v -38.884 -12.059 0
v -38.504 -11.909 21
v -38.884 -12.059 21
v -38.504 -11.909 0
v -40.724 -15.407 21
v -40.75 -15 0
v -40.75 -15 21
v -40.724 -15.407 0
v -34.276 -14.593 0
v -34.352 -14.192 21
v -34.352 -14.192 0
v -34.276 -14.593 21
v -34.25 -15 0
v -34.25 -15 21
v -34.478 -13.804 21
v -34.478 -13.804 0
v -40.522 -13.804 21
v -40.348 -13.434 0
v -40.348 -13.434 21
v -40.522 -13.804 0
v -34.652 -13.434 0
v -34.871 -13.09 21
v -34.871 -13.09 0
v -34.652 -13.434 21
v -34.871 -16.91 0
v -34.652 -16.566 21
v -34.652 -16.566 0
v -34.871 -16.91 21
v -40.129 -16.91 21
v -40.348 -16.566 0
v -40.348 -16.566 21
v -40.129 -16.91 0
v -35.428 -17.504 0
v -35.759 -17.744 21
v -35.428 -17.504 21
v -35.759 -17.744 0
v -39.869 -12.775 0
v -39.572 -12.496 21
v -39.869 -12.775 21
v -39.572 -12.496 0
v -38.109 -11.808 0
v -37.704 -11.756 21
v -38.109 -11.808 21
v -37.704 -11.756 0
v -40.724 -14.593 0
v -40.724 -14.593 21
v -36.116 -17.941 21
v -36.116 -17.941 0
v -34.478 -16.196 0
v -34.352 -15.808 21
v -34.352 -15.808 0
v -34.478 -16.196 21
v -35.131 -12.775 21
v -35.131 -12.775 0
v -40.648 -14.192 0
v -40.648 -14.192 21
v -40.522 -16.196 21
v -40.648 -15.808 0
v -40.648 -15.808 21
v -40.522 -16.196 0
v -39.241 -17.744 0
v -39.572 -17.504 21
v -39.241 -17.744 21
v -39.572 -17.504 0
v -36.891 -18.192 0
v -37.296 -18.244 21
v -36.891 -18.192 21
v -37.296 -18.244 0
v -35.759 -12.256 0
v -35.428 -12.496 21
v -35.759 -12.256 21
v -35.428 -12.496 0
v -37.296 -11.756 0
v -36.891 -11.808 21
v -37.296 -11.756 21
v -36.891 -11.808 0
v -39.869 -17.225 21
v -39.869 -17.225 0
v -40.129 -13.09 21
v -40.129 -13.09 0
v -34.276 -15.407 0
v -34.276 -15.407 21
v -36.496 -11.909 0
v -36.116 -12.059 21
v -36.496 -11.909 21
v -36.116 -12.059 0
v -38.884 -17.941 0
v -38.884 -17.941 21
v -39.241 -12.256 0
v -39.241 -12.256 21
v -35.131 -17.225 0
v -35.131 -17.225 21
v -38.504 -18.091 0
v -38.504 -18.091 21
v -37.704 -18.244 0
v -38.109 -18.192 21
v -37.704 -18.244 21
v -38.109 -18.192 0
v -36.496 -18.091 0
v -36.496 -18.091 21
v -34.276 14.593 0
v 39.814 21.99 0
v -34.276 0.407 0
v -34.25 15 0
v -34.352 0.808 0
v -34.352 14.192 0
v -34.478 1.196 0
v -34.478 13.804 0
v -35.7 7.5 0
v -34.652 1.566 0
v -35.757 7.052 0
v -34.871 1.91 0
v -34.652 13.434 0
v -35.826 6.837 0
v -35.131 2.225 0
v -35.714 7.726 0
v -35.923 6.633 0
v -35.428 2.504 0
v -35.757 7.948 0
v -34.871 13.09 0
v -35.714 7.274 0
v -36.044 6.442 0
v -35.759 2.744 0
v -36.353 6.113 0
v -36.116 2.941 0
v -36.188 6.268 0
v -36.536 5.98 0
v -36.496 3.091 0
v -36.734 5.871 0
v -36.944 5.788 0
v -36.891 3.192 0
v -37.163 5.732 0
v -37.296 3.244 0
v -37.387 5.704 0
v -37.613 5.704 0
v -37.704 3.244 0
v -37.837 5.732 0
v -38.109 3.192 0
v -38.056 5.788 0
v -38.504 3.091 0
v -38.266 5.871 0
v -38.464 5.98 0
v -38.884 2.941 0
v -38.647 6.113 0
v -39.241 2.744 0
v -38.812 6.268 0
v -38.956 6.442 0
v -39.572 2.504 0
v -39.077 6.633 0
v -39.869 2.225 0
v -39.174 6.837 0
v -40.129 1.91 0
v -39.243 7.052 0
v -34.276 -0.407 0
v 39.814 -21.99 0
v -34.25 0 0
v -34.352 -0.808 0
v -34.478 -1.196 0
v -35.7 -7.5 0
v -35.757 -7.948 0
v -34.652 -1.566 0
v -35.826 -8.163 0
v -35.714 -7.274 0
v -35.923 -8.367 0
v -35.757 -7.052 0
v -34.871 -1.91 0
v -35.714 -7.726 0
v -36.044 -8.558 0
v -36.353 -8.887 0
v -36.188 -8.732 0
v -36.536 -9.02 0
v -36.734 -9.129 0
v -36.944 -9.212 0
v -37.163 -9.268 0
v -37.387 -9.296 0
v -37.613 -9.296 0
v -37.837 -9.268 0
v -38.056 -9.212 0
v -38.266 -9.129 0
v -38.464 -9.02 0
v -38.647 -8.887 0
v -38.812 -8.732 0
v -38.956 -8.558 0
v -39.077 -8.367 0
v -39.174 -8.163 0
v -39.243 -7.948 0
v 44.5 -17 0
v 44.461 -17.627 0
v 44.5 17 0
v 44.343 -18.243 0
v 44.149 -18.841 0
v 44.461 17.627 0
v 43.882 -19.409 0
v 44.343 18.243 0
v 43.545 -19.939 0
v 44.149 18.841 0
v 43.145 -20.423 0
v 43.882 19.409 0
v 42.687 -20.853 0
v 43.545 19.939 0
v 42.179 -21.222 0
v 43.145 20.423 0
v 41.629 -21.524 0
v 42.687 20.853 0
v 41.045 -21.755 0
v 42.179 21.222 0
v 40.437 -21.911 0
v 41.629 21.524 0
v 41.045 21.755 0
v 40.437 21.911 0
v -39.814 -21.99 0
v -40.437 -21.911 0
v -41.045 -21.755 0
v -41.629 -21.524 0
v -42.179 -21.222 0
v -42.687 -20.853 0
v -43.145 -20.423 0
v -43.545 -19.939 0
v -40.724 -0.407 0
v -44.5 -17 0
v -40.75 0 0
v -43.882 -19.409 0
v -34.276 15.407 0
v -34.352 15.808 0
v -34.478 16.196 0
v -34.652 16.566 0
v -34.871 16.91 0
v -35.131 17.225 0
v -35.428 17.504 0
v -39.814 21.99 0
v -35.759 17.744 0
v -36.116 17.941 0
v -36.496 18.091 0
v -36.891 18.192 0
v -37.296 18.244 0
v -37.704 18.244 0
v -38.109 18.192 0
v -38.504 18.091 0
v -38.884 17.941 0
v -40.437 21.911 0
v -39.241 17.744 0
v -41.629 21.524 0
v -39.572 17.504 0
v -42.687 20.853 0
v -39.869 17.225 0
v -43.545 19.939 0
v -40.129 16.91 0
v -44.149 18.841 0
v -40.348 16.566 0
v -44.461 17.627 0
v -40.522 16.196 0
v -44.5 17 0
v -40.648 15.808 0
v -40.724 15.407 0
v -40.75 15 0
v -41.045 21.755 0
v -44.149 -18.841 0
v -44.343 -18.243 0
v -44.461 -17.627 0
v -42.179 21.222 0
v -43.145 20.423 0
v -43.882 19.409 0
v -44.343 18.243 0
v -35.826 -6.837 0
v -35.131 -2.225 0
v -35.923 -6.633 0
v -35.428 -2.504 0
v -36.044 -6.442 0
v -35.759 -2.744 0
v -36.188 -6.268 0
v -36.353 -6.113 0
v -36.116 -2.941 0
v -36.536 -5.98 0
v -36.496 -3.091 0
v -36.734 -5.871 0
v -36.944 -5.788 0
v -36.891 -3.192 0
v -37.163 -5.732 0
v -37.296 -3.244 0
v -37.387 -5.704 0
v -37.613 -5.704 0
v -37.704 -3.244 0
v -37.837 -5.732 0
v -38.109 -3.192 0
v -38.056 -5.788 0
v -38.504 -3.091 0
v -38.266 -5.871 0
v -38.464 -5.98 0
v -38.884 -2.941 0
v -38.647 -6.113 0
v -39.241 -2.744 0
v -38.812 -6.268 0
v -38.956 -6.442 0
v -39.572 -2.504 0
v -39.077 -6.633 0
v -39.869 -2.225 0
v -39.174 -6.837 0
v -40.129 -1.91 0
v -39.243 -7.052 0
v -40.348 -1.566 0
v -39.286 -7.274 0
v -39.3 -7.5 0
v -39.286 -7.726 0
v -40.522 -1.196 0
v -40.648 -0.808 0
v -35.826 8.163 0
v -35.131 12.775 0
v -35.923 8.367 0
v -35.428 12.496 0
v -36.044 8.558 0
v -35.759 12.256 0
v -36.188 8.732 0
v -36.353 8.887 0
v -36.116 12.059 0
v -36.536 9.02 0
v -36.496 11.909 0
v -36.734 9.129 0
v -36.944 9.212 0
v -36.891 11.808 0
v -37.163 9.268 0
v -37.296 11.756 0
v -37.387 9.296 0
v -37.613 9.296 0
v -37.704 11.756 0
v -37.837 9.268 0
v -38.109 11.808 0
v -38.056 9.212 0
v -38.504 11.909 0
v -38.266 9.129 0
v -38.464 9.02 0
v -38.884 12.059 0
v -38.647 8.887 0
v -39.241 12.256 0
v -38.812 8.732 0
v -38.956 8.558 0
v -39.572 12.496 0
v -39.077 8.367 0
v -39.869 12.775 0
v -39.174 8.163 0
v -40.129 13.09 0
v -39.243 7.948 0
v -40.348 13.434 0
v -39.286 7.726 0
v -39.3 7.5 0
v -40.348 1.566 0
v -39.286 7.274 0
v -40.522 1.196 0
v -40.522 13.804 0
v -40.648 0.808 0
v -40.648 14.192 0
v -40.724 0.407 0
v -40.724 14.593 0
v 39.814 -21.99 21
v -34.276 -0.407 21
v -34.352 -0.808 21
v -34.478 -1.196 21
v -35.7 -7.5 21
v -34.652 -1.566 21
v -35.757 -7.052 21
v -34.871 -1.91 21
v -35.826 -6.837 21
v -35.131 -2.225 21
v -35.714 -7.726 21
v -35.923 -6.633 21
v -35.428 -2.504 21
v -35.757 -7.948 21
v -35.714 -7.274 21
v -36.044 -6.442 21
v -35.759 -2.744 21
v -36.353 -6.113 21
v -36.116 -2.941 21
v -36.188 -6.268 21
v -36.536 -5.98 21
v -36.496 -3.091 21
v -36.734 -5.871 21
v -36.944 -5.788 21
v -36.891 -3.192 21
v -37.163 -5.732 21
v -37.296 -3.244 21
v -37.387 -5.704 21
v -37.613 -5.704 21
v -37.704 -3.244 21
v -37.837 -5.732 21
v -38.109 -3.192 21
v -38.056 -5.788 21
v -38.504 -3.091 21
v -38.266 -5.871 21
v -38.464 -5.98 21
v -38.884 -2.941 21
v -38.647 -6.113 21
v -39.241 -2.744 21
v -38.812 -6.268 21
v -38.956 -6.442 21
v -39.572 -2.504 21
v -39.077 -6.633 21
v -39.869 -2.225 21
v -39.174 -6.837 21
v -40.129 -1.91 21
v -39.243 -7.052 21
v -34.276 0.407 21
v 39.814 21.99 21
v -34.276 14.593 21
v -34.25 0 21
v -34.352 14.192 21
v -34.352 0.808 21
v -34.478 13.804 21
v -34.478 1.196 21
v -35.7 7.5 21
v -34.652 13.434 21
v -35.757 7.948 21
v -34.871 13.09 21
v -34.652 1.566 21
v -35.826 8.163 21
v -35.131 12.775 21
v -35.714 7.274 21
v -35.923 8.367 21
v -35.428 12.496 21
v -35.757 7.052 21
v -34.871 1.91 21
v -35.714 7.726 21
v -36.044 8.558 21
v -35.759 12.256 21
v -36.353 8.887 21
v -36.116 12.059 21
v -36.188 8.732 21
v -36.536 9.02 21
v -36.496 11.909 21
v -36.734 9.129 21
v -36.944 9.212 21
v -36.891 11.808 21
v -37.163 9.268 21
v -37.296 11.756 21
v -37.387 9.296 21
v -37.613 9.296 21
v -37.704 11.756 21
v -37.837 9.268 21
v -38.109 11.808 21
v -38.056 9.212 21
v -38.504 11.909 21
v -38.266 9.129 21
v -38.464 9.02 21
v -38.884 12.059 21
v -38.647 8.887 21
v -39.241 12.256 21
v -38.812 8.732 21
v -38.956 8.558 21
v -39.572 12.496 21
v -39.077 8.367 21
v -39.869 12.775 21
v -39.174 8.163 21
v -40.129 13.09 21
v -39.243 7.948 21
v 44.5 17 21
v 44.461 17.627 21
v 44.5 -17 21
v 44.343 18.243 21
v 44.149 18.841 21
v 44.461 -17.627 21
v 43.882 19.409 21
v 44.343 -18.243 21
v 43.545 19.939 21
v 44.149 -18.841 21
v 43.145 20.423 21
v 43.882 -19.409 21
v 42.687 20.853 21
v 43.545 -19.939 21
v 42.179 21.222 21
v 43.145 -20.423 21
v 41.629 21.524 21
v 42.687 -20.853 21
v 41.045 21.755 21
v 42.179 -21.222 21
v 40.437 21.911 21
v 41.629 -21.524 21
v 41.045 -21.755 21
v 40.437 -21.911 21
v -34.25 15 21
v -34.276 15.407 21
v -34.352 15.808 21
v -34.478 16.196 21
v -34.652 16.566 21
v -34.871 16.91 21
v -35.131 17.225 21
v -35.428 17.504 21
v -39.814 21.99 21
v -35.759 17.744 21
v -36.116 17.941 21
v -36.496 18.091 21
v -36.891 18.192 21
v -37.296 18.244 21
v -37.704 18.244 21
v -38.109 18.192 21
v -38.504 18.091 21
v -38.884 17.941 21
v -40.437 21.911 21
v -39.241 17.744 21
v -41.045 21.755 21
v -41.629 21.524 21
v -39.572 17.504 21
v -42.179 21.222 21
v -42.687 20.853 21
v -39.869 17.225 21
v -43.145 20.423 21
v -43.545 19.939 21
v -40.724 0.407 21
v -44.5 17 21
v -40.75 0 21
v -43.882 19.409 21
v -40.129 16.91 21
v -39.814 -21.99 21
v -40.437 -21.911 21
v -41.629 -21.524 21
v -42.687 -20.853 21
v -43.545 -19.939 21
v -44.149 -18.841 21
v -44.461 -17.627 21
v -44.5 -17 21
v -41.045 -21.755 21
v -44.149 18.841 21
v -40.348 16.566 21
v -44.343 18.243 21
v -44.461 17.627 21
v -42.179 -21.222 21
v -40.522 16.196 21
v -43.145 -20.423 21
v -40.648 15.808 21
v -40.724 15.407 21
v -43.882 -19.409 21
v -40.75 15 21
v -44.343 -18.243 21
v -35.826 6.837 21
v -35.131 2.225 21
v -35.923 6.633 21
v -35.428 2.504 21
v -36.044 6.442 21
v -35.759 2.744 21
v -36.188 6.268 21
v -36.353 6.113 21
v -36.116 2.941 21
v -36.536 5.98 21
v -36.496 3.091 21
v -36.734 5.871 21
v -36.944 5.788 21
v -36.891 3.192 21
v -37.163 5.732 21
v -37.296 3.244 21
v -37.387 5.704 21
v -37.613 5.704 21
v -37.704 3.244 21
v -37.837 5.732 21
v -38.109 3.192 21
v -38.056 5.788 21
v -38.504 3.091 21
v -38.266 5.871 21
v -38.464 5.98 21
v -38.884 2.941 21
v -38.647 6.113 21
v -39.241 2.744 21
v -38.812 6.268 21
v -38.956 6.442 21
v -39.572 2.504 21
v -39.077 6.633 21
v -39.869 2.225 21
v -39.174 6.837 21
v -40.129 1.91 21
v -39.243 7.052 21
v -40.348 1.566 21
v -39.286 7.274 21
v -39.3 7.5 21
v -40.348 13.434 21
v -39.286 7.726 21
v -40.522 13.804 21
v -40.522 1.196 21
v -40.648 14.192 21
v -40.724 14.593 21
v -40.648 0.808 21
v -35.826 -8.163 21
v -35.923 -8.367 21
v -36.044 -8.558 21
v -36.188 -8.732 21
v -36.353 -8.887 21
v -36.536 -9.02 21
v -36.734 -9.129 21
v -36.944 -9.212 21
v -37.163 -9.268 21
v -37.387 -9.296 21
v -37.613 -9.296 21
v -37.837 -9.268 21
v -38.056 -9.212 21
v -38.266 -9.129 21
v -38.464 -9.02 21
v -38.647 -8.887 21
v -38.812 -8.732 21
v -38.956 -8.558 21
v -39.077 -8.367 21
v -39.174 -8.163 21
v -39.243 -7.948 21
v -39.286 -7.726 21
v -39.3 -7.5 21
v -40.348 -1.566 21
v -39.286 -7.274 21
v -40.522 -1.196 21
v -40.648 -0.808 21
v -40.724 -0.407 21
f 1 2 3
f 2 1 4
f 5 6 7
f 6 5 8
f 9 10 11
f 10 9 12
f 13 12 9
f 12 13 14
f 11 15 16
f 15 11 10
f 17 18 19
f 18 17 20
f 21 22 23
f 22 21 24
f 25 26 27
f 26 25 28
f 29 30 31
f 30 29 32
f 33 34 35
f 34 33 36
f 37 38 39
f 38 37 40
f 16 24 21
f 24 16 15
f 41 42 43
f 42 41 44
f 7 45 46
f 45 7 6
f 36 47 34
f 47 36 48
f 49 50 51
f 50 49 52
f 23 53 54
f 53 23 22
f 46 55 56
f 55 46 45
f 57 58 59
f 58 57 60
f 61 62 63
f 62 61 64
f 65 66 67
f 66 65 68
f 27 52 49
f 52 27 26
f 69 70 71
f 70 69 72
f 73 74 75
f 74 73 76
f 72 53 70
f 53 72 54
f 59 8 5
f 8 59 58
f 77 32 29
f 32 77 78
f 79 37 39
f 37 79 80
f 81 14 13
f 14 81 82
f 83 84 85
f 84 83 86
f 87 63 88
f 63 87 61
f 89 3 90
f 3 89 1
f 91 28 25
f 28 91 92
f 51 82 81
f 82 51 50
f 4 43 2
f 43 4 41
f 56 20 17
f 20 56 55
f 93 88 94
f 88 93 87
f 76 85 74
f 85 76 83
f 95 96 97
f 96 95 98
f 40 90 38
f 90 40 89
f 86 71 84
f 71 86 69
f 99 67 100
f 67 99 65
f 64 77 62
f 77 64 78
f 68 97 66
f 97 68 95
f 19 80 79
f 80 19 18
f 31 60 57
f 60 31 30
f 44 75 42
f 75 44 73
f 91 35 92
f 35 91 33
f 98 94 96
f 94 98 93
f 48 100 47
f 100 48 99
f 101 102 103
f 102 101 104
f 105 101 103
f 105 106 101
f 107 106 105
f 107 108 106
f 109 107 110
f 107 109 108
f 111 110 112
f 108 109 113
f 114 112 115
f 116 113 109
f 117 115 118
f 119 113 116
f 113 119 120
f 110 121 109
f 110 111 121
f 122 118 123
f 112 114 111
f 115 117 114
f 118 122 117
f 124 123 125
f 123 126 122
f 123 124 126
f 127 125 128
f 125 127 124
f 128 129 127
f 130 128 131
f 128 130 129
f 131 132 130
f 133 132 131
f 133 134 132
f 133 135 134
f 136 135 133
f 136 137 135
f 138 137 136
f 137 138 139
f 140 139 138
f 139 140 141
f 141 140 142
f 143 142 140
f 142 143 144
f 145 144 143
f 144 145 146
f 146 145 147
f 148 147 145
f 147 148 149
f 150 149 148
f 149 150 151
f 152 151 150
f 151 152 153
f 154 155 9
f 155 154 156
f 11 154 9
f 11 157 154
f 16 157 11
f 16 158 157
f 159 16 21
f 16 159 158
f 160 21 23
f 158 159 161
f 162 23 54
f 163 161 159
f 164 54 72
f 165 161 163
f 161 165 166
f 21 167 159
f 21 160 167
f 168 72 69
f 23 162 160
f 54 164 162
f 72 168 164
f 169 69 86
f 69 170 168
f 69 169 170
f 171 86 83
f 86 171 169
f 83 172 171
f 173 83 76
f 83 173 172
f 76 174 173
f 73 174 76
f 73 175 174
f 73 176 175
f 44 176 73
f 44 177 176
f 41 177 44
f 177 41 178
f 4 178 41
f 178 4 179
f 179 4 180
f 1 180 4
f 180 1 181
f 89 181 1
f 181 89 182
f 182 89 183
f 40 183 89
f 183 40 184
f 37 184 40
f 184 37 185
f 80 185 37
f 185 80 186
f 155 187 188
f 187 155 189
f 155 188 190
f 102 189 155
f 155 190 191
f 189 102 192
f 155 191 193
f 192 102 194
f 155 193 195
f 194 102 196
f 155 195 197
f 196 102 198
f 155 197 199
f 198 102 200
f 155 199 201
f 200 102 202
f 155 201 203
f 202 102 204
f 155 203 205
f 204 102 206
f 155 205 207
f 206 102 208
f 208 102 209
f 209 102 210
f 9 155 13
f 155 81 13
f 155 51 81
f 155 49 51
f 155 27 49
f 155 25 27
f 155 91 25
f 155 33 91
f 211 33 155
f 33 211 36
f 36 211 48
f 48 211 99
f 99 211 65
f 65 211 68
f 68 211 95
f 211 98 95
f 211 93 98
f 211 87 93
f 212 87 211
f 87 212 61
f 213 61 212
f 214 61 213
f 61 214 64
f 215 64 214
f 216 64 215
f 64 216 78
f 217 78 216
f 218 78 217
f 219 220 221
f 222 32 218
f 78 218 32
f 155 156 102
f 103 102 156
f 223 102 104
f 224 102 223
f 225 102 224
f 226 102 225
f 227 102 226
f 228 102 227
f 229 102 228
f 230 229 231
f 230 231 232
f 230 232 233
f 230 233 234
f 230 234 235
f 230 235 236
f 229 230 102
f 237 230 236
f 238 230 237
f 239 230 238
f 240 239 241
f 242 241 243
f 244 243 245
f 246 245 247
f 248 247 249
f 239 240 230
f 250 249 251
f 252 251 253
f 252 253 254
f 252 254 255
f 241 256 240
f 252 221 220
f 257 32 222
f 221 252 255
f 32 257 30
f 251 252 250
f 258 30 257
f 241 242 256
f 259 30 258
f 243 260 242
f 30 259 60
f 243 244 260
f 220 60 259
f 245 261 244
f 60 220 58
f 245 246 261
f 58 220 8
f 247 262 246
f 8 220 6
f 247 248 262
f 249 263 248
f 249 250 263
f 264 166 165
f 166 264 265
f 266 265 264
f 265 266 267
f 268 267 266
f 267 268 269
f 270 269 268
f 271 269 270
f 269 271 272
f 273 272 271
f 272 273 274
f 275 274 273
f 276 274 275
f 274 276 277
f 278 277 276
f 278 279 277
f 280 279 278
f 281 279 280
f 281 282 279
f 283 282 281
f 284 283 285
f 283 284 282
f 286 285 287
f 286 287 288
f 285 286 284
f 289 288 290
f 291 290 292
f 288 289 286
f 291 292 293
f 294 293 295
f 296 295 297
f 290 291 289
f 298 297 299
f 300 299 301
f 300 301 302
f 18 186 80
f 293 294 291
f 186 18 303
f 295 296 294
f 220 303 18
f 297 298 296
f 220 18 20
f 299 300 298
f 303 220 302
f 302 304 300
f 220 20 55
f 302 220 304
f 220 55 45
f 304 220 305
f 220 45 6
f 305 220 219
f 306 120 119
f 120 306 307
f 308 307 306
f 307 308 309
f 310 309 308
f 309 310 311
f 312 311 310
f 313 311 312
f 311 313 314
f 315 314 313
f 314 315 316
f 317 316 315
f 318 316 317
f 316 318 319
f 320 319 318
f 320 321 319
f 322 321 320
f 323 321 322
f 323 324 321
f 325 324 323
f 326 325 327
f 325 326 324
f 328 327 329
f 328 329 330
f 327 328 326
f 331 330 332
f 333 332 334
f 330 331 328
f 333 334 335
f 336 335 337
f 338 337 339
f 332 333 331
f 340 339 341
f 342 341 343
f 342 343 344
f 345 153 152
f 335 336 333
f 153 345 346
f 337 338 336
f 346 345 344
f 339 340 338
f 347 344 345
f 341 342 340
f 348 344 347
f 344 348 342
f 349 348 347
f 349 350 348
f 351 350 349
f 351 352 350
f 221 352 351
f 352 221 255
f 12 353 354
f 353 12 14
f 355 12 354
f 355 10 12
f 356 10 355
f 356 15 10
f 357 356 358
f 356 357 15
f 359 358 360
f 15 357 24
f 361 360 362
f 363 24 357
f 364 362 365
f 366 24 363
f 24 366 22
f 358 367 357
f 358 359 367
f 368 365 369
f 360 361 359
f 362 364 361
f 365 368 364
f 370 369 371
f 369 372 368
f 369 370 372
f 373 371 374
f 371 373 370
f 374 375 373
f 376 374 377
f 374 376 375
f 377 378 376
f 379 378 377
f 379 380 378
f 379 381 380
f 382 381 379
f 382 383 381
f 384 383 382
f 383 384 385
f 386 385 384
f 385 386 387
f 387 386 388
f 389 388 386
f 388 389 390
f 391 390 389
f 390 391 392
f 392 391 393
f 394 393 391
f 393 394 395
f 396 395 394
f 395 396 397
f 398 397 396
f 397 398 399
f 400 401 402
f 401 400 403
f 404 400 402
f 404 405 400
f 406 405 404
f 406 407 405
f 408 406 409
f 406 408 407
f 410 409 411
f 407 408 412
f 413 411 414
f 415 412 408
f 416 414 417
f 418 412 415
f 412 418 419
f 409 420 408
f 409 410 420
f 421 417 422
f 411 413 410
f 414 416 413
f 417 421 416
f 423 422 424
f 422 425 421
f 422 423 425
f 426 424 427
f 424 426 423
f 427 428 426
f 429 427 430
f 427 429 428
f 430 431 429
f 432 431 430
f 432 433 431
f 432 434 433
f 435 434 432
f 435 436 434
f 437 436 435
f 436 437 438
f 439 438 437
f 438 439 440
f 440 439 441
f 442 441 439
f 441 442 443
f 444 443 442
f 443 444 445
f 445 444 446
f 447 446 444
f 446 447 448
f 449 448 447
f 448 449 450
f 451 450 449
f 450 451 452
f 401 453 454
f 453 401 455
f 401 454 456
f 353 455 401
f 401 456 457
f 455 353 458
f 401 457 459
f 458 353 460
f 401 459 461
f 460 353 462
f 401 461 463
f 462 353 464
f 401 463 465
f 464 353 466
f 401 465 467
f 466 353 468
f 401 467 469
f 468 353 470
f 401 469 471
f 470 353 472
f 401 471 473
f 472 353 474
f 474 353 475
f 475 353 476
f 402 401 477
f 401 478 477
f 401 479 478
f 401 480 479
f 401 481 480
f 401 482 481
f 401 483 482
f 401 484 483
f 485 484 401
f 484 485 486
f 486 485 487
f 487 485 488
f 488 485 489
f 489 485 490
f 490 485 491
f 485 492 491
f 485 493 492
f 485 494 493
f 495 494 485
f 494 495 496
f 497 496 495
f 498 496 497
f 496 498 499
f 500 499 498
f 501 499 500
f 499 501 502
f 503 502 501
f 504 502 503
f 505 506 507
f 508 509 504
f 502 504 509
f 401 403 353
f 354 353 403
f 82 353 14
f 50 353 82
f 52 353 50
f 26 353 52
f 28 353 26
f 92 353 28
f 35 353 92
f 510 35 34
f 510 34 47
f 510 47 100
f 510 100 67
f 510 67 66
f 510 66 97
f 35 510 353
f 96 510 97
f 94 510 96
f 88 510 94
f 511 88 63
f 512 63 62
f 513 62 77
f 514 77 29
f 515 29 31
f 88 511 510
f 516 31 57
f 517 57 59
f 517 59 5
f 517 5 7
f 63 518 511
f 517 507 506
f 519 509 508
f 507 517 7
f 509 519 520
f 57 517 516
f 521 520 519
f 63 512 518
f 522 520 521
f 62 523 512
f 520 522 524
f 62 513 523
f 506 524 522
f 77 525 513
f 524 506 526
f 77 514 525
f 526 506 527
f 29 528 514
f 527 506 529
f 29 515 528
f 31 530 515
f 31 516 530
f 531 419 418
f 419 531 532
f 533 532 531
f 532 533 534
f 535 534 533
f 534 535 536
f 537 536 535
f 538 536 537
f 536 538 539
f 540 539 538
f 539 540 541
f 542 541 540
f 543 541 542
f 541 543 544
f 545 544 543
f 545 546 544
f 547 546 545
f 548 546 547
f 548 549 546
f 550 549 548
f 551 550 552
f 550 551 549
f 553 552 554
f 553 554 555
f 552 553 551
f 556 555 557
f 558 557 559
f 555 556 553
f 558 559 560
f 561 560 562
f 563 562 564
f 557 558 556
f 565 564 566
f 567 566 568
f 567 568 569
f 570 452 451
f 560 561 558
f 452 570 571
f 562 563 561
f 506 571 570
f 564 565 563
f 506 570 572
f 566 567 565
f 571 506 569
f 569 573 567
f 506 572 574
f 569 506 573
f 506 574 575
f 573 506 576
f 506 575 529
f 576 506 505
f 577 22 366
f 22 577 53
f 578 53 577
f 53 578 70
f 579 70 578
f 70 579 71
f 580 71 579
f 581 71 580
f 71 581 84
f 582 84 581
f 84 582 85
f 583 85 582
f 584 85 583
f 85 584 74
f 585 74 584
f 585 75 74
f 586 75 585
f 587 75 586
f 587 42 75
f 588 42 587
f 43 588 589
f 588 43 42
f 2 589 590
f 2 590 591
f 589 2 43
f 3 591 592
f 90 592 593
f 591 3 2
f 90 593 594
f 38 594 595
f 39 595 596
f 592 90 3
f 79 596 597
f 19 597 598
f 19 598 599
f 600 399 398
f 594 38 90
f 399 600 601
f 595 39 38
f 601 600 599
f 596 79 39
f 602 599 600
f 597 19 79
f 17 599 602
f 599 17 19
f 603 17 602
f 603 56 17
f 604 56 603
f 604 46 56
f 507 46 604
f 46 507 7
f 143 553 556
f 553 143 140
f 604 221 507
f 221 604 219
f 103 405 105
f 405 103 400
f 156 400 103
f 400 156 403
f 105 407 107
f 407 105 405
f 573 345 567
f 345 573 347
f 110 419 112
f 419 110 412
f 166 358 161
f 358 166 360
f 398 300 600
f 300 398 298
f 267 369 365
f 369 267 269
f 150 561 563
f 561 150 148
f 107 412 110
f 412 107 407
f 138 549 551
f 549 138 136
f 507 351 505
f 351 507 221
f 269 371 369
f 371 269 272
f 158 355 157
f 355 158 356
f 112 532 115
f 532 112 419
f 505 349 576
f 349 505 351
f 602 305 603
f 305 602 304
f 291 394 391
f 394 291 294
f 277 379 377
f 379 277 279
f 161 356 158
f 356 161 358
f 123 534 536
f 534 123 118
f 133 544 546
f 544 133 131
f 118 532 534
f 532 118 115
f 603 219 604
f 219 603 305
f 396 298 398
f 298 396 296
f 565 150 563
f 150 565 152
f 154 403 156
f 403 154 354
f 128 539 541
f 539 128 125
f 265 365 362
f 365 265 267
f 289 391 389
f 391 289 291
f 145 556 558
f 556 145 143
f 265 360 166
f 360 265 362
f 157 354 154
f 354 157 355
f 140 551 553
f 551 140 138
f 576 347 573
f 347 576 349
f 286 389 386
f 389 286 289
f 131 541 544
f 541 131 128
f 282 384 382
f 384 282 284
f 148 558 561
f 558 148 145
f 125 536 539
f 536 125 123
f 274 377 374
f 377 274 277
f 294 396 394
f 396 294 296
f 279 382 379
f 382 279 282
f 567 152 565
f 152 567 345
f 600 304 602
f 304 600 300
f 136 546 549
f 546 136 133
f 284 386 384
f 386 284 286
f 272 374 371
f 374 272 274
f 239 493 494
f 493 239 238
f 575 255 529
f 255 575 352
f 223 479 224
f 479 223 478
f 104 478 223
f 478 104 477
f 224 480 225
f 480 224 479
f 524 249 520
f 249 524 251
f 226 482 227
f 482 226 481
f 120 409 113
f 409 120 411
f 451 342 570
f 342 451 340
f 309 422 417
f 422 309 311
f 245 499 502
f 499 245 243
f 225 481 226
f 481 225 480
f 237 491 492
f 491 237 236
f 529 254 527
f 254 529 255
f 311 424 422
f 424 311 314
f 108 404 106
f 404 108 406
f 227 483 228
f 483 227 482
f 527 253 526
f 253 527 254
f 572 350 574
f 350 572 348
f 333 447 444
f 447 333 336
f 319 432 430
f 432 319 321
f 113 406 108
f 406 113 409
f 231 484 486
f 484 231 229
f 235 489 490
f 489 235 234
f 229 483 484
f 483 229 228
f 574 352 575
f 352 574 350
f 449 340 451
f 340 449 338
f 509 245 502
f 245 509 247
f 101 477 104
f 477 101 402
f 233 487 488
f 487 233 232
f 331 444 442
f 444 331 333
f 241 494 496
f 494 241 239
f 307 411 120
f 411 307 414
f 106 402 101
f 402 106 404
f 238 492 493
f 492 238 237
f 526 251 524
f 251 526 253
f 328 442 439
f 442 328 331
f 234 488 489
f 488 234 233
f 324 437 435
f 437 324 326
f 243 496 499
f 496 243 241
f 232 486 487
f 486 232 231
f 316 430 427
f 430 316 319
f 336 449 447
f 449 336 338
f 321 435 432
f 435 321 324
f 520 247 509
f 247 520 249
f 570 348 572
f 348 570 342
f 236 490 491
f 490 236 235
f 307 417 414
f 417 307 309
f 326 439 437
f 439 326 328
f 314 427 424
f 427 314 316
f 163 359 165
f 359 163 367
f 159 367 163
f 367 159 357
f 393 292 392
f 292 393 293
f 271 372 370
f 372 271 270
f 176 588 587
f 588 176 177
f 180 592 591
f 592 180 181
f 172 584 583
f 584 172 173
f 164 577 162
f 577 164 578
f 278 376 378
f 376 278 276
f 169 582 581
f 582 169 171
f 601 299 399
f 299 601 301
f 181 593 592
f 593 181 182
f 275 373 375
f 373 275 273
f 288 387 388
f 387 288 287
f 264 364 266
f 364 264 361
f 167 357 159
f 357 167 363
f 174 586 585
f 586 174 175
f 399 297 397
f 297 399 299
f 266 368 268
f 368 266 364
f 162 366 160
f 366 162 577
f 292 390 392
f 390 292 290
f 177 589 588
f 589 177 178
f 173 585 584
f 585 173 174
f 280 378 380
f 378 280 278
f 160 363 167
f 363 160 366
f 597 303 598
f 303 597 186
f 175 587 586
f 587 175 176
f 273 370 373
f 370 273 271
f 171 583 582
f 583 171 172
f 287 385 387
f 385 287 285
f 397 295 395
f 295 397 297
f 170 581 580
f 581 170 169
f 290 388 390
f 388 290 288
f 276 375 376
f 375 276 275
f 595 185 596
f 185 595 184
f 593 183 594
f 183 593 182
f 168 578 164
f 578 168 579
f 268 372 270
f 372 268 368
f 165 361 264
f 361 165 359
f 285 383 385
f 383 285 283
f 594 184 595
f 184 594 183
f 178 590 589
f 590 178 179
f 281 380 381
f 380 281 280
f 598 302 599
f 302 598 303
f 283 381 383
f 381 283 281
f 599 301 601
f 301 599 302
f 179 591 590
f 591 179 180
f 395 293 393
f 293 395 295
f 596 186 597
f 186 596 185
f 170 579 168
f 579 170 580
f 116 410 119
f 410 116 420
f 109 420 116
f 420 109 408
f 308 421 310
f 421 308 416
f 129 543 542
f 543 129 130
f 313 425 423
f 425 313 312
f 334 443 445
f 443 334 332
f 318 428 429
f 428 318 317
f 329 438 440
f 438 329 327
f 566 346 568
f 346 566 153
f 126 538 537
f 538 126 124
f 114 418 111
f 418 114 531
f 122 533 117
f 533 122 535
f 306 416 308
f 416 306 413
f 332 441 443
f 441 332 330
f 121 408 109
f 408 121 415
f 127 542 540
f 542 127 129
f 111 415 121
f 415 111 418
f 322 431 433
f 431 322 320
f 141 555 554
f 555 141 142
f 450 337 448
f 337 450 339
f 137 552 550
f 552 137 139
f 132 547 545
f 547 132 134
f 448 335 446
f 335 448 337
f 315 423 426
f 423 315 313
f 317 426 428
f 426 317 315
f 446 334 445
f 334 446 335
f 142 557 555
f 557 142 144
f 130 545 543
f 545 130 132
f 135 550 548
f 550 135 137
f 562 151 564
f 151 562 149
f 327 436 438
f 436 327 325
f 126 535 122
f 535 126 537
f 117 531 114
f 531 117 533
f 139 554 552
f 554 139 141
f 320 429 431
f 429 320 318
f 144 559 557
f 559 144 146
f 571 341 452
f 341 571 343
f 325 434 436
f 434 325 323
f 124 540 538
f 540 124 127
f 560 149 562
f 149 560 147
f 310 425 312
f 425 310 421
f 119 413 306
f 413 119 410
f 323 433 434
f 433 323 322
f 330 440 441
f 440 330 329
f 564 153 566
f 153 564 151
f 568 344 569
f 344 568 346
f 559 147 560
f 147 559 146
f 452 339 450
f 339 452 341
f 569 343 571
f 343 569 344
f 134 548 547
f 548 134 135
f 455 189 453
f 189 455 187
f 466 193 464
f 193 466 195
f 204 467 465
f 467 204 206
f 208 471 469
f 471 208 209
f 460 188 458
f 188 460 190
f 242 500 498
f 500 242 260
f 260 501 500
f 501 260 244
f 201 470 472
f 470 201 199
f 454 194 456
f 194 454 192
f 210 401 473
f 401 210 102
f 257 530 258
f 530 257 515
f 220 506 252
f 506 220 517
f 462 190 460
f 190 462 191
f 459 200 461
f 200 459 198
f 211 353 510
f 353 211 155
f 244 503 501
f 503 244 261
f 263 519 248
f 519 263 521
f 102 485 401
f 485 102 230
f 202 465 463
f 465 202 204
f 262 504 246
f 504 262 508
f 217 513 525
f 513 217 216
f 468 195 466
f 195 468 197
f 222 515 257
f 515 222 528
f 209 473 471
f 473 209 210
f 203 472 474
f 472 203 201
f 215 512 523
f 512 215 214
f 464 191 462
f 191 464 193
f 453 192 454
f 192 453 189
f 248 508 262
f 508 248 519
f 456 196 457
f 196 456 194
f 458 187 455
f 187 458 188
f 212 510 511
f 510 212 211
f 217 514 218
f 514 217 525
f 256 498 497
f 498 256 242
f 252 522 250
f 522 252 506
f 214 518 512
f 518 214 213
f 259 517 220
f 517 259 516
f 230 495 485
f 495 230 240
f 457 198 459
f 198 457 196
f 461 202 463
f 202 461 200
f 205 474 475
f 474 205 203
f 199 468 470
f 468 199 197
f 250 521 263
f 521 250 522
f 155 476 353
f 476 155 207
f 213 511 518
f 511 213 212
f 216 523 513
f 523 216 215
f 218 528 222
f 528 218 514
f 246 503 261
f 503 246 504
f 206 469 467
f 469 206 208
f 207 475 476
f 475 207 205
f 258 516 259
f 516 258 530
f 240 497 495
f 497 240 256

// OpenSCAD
$fn = 50;


difference() {
	union() {
		hull() {
			translate(v = [-39.5000000000, 17.0000000000, 0]) {
				cylinder(h = 21, r = 5);
			}
			translate(v = [39.5000000000, 17.0000000000, 0]) {
				cylinder(h = 21, r = 5);
			}
			translate(v = [-39.5000000000, -17.0000000000, 0]) {
				cylinder(h = 21, r = 5);
			}
			translate(v = [39.5000000000, -17.0000000000, 0]) {
				cylinder(h = 21, r = 5);
			}
		}
	}
	union() {
		translate(v = [-37.5000000000, -15.0000000000, 0]) {
			cylinder(h = 21, r = 3.2500000000);
		}
		translate(v = [-37.5000000000, 0.0000000000, 0]) {
			cylinder(h = 21, r = 3.2500000000);
		}
		translate(v = [-37.5000000000, 15.0000000000, 0]) {
			cylinder(h = 21, r = 3.2500000000);
		}
		translate(v = [-37.5000000000, -15.0000000000, 0]) {
			cylinder(h = 21, r = 1.8000000000);
		}
		translate(v = [-37.5000000000, -7.5000000000, 0]) {
			cylinder(h = 21, r = 1.8000000000);
		}
		translate(v = [-37.5000000000, 0.0000000000, 0]) {
			cylinder(h = 21, r = 1.8000000000);
		}
		translate(v = [-37.5000000000, 7.5000000000, 0]) {
			cylinder(h = 21, r = 1.8000000000);
		}
		translate(v = [-37.5000000000, 15.0000000000, 0]) {
			cylinder(h = 21, r = 1.8000000000);
		}
		translate(v = [-37.5000000000, -15.0000000000, 0]) {
			cylinder(h = 21, r = 1.8000000000);
		}
		translate(v = [-37.5000000000, -7.5000000000, 0]) {
			cylinder(h = 21, r = 1.8000000000);
		}
		translate(v = [-37.5000000000, 0.0000000000, 0]) {
			cylinder(h = 21, r = 1.8000000000);
		}
		translate(v = [-37.5000000000, 7.5000000000, 0]) {
			cylinder(h = 21, r = 1.8000000000);
		}
		translate(v = [-37.5000000000, 15.0000000000, 0]) {
			cylinder(h = 21, r = 1.8000000000);
		}
		translate(v = [-37.5000000000, -15.0000000000, 0]) {
			cylinder(h = 21, r = 1.8000000000);
		}
		translate(v = [-37.5000000000, -7.5000000000, 0]) {
			cylinder(h = 21, r = 1.8000000000);
		}
		translate(v = [-37.5000000000, 0.0000000000, 0]) {
			cylinder(h = 21, r = 1.8000000000);
		}
		translate(v = [-37.5000000000, 7.5000000000, 0]) {
			cylinder(h = 21, r = 1.8000000000);
		}
		translate(v = [-37.5000000000, 15.0000000000, 0]) {
			cylinder(h = 21, r = 1.8000000000);
		}
	}
}
